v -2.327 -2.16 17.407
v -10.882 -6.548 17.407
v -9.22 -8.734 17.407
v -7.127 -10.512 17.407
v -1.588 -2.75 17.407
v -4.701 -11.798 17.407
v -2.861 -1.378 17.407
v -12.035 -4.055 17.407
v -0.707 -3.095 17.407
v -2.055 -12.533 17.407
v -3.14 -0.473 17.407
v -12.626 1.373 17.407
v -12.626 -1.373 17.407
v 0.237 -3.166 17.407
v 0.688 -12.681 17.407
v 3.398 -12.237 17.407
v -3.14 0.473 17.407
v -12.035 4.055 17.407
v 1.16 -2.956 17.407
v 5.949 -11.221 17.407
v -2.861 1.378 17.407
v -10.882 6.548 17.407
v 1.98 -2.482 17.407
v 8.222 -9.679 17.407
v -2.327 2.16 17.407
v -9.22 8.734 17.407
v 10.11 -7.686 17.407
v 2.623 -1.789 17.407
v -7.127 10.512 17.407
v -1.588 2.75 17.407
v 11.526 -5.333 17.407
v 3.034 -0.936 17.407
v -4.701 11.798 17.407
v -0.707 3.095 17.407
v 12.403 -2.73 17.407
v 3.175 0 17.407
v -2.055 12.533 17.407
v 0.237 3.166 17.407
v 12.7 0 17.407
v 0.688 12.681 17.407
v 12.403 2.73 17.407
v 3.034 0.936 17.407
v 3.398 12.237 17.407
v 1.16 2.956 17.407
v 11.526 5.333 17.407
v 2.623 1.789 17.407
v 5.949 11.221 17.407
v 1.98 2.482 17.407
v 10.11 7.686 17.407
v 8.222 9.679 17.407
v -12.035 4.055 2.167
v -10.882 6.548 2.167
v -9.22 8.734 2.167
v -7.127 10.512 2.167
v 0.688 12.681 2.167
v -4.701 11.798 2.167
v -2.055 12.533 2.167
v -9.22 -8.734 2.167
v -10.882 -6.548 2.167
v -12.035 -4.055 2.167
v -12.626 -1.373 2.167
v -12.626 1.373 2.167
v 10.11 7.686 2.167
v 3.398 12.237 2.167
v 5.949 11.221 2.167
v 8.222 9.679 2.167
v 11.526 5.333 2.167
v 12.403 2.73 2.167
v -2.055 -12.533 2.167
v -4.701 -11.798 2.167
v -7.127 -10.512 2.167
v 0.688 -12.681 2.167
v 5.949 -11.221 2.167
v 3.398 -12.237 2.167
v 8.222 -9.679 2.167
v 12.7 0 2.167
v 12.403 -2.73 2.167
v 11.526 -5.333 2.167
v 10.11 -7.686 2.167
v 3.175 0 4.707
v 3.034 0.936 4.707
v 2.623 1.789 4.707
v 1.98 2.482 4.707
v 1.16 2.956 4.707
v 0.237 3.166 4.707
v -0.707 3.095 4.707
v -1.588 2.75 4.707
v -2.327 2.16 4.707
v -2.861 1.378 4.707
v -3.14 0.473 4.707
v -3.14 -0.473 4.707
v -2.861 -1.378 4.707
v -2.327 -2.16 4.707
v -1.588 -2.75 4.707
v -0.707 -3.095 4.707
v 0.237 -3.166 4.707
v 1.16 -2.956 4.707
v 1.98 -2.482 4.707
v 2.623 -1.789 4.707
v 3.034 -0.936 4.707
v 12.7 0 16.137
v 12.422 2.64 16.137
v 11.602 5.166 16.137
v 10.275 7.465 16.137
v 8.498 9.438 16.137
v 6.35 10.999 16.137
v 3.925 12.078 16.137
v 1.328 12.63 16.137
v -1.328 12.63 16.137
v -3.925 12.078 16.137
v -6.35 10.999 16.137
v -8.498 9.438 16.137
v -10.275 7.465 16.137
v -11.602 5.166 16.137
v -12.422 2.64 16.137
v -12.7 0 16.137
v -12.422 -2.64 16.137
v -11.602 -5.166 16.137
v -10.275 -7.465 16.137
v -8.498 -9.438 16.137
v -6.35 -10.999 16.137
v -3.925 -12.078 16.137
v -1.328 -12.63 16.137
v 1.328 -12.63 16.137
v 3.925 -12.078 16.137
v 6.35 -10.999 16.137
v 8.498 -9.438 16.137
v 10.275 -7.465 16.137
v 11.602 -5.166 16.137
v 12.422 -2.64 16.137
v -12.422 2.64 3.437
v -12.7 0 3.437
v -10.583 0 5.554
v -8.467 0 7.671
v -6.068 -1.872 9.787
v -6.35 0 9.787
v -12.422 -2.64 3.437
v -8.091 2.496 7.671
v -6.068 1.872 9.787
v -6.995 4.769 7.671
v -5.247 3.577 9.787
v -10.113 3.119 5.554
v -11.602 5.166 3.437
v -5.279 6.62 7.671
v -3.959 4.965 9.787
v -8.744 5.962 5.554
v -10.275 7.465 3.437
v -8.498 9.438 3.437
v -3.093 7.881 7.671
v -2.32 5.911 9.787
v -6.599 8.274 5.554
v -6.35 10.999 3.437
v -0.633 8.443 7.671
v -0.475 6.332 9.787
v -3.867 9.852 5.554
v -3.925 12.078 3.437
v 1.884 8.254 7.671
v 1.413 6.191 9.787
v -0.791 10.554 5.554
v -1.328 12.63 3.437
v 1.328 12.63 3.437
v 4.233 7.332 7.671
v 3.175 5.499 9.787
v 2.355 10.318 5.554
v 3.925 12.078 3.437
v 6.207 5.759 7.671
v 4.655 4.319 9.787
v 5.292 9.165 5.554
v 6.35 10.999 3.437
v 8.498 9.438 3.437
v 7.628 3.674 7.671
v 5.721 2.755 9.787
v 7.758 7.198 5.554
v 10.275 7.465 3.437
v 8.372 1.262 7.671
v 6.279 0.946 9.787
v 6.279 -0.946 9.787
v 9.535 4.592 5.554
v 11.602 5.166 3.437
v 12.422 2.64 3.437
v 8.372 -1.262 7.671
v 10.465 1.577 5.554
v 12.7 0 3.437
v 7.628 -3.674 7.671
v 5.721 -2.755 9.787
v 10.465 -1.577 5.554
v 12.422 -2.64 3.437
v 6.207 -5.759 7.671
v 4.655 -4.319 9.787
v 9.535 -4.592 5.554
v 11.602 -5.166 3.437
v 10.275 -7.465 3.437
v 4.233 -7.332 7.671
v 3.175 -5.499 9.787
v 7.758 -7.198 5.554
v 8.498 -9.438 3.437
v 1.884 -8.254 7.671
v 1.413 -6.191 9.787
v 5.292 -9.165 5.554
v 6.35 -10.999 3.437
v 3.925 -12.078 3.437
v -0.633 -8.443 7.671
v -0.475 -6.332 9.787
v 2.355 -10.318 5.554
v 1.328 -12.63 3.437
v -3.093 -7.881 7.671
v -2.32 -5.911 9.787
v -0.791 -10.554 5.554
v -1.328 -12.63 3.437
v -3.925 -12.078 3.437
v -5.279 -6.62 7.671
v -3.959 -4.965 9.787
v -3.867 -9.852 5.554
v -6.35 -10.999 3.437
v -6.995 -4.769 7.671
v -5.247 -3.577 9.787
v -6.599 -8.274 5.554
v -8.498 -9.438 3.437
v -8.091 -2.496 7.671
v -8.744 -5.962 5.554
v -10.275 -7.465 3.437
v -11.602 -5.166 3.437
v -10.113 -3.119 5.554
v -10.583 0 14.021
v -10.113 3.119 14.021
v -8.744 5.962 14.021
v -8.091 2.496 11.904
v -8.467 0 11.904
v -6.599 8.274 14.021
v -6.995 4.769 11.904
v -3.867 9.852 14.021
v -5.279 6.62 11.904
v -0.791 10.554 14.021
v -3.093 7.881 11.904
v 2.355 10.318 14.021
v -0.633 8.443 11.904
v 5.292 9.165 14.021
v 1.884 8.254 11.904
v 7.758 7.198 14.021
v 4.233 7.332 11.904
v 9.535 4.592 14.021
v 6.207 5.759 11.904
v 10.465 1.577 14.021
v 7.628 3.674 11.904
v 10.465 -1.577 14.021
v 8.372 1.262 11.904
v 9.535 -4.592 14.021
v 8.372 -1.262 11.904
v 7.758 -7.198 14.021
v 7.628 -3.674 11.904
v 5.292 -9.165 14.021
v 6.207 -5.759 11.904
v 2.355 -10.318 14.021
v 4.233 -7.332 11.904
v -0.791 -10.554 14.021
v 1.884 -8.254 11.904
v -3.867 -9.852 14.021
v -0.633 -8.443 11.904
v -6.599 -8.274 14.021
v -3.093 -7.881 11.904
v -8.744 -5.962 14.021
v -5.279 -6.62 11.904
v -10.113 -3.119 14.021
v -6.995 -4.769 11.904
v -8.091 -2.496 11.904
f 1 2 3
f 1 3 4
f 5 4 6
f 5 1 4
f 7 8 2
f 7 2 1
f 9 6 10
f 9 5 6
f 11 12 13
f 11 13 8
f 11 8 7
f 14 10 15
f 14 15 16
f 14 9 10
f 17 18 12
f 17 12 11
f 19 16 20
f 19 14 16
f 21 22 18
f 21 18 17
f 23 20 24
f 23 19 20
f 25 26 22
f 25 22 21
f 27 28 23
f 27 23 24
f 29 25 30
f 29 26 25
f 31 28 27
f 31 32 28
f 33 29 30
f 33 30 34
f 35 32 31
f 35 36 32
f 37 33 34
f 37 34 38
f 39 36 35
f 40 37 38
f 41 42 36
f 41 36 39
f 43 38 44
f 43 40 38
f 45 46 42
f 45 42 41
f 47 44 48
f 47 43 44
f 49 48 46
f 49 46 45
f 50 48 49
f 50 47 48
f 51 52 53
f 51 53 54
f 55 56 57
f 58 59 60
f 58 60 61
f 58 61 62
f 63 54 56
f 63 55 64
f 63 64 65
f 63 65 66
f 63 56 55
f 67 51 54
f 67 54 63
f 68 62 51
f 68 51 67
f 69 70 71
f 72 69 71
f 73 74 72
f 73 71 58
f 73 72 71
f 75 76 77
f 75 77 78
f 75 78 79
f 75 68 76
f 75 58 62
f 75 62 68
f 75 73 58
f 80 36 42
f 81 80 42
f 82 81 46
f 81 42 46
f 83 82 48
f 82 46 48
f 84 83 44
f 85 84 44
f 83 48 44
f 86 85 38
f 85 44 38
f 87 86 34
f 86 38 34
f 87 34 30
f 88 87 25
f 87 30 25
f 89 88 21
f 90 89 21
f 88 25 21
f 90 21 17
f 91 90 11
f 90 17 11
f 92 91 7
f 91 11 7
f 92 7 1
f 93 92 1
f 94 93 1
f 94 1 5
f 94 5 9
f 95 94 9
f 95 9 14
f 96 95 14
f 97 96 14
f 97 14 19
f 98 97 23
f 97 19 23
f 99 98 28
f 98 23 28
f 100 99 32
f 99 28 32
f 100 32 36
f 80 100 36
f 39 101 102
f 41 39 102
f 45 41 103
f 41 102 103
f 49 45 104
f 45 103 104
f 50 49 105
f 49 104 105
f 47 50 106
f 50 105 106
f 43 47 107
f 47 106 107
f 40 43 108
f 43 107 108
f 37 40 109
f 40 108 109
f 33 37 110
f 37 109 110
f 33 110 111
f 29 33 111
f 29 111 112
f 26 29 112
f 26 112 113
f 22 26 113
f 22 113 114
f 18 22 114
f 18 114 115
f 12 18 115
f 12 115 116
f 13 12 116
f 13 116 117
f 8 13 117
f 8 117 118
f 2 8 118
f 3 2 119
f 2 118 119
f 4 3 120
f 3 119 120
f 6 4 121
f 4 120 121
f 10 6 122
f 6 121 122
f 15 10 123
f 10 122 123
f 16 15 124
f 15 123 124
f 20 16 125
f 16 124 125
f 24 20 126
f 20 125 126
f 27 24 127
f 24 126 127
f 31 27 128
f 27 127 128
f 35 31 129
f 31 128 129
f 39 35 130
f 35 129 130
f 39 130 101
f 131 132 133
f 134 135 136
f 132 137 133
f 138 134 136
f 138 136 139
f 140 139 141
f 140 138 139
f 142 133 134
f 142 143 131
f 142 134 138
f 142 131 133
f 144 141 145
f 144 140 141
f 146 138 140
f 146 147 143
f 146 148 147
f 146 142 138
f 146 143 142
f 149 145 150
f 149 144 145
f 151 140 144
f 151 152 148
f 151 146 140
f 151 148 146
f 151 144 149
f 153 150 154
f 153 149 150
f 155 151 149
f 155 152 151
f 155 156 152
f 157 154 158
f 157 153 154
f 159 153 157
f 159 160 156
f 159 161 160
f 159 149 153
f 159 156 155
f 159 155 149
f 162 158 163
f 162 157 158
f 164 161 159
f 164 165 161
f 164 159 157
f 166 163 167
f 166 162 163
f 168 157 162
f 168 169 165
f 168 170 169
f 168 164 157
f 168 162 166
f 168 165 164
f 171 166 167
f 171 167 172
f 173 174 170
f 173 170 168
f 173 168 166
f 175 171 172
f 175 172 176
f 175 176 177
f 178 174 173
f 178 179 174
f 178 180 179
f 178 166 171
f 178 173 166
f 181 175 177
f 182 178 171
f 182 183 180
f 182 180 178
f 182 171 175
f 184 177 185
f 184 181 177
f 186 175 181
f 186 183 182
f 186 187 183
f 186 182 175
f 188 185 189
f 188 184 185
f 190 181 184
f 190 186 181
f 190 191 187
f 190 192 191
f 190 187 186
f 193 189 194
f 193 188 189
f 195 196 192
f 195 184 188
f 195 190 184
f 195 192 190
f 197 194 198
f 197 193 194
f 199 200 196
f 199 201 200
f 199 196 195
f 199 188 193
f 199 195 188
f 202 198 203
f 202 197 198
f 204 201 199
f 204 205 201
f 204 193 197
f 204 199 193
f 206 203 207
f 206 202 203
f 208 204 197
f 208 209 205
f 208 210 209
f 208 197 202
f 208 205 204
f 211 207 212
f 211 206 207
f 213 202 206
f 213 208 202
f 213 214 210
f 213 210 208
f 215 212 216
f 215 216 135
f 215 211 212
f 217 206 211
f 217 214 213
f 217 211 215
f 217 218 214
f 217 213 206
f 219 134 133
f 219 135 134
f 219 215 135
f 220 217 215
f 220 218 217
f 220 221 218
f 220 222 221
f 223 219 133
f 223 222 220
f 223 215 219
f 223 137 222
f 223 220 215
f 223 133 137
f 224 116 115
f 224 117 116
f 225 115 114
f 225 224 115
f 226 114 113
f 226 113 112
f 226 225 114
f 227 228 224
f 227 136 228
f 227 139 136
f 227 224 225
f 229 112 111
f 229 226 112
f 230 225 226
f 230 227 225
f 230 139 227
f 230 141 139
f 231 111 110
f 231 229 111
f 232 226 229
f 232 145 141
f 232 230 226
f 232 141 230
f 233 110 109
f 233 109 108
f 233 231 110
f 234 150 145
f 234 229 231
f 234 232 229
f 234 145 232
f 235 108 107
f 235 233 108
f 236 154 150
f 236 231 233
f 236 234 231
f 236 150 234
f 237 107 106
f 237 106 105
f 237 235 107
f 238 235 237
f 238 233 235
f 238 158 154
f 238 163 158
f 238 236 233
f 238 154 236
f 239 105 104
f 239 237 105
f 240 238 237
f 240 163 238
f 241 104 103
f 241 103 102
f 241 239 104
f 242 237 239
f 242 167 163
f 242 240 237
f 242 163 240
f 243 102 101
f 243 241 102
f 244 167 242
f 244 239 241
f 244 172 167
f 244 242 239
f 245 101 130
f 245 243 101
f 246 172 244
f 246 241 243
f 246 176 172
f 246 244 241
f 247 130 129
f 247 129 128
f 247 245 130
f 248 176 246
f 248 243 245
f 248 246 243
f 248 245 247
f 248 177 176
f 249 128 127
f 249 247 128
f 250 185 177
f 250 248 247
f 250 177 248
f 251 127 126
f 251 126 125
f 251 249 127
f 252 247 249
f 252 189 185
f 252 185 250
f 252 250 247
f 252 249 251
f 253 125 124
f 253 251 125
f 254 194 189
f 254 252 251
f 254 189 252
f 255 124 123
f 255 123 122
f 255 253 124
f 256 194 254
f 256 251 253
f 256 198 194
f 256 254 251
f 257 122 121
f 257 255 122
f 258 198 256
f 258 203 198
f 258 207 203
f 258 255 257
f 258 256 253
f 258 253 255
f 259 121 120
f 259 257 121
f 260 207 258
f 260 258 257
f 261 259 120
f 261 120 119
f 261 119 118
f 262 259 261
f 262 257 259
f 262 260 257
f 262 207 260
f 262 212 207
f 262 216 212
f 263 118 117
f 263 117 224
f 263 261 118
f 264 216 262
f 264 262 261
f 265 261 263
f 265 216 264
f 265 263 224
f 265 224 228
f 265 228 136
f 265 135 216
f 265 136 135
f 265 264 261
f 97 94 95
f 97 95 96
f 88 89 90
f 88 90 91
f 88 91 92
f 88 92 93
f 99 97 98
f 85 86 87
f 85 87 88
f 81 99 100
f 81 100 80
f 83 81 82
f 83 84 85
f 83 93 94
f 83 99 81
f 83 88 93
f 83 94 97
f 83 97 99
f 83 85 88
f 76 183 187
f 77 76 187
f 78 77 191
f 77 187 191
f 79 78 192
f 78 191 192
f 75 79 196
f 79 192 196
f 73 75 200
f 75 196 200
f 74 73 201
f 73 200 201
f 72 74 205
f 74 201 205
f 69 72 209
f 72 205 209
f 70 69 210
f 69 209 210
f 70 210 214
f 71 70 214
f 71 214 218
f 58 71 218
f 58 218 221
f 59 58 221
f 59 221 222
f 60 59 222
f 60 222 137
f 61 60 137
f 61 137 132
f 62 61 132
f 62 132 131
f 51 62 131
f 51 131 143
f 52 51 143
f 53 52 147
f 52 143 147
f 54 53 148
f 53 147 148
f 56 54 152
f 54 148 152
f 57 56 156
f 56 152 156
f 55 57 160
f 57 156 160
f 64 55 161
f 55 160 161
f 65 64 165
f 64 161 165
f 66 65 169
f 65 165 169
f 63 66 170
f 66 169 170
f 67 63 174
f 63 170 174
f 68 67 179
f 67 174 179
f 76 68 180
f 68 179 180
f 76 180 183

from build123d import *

# Parameters (mm, degrees)
F2_R     = 12.7
F3_DEPTH = 1.27
F4_R     = 12.7
F5_DEPTH = 1.27
F7_R     = 3.175
F8_DEPTH = 12.7


with BuildPart() as f1:
    # F0 (on Front) → F1 (revolve)
    with BuildSketch(Plane.XZ):
        Polygon((0, 3.437184), (0, 16.137184), (-12.7, 16.137184), (-6.35, 9.787184), (-12.7, 3.437184), (-6.35, 3.437184), align=None)
    revolve(axis=Axis((0, 0, 9.787184), (0, 0, -1)))

    # F2 (on face) → F3 (join)
    with BuildSketch(Plane.XY.offset(16.137184)):
        Circle(F2_R)
    extrude(amount=F3_DEPTH)

    # F4 (on face) → F5 (join)
    with BuildSketch(Plane(origin=(0, 0, 3.437184), x_dir=(1, 0, 0), z_dir=(0, 0, -1))):
        Circle(F4_R)
    extrude(amount=F5_DEPTH)

    # F7 (on face) → F8 (cut)
    with BuildSketch(Plane.XY.offset(17.407184)):
        Circle(F7_R)
    extrude(amount=-F8_DEPTH, mode=Mode.SUBTRACT)


solid = f1.part
